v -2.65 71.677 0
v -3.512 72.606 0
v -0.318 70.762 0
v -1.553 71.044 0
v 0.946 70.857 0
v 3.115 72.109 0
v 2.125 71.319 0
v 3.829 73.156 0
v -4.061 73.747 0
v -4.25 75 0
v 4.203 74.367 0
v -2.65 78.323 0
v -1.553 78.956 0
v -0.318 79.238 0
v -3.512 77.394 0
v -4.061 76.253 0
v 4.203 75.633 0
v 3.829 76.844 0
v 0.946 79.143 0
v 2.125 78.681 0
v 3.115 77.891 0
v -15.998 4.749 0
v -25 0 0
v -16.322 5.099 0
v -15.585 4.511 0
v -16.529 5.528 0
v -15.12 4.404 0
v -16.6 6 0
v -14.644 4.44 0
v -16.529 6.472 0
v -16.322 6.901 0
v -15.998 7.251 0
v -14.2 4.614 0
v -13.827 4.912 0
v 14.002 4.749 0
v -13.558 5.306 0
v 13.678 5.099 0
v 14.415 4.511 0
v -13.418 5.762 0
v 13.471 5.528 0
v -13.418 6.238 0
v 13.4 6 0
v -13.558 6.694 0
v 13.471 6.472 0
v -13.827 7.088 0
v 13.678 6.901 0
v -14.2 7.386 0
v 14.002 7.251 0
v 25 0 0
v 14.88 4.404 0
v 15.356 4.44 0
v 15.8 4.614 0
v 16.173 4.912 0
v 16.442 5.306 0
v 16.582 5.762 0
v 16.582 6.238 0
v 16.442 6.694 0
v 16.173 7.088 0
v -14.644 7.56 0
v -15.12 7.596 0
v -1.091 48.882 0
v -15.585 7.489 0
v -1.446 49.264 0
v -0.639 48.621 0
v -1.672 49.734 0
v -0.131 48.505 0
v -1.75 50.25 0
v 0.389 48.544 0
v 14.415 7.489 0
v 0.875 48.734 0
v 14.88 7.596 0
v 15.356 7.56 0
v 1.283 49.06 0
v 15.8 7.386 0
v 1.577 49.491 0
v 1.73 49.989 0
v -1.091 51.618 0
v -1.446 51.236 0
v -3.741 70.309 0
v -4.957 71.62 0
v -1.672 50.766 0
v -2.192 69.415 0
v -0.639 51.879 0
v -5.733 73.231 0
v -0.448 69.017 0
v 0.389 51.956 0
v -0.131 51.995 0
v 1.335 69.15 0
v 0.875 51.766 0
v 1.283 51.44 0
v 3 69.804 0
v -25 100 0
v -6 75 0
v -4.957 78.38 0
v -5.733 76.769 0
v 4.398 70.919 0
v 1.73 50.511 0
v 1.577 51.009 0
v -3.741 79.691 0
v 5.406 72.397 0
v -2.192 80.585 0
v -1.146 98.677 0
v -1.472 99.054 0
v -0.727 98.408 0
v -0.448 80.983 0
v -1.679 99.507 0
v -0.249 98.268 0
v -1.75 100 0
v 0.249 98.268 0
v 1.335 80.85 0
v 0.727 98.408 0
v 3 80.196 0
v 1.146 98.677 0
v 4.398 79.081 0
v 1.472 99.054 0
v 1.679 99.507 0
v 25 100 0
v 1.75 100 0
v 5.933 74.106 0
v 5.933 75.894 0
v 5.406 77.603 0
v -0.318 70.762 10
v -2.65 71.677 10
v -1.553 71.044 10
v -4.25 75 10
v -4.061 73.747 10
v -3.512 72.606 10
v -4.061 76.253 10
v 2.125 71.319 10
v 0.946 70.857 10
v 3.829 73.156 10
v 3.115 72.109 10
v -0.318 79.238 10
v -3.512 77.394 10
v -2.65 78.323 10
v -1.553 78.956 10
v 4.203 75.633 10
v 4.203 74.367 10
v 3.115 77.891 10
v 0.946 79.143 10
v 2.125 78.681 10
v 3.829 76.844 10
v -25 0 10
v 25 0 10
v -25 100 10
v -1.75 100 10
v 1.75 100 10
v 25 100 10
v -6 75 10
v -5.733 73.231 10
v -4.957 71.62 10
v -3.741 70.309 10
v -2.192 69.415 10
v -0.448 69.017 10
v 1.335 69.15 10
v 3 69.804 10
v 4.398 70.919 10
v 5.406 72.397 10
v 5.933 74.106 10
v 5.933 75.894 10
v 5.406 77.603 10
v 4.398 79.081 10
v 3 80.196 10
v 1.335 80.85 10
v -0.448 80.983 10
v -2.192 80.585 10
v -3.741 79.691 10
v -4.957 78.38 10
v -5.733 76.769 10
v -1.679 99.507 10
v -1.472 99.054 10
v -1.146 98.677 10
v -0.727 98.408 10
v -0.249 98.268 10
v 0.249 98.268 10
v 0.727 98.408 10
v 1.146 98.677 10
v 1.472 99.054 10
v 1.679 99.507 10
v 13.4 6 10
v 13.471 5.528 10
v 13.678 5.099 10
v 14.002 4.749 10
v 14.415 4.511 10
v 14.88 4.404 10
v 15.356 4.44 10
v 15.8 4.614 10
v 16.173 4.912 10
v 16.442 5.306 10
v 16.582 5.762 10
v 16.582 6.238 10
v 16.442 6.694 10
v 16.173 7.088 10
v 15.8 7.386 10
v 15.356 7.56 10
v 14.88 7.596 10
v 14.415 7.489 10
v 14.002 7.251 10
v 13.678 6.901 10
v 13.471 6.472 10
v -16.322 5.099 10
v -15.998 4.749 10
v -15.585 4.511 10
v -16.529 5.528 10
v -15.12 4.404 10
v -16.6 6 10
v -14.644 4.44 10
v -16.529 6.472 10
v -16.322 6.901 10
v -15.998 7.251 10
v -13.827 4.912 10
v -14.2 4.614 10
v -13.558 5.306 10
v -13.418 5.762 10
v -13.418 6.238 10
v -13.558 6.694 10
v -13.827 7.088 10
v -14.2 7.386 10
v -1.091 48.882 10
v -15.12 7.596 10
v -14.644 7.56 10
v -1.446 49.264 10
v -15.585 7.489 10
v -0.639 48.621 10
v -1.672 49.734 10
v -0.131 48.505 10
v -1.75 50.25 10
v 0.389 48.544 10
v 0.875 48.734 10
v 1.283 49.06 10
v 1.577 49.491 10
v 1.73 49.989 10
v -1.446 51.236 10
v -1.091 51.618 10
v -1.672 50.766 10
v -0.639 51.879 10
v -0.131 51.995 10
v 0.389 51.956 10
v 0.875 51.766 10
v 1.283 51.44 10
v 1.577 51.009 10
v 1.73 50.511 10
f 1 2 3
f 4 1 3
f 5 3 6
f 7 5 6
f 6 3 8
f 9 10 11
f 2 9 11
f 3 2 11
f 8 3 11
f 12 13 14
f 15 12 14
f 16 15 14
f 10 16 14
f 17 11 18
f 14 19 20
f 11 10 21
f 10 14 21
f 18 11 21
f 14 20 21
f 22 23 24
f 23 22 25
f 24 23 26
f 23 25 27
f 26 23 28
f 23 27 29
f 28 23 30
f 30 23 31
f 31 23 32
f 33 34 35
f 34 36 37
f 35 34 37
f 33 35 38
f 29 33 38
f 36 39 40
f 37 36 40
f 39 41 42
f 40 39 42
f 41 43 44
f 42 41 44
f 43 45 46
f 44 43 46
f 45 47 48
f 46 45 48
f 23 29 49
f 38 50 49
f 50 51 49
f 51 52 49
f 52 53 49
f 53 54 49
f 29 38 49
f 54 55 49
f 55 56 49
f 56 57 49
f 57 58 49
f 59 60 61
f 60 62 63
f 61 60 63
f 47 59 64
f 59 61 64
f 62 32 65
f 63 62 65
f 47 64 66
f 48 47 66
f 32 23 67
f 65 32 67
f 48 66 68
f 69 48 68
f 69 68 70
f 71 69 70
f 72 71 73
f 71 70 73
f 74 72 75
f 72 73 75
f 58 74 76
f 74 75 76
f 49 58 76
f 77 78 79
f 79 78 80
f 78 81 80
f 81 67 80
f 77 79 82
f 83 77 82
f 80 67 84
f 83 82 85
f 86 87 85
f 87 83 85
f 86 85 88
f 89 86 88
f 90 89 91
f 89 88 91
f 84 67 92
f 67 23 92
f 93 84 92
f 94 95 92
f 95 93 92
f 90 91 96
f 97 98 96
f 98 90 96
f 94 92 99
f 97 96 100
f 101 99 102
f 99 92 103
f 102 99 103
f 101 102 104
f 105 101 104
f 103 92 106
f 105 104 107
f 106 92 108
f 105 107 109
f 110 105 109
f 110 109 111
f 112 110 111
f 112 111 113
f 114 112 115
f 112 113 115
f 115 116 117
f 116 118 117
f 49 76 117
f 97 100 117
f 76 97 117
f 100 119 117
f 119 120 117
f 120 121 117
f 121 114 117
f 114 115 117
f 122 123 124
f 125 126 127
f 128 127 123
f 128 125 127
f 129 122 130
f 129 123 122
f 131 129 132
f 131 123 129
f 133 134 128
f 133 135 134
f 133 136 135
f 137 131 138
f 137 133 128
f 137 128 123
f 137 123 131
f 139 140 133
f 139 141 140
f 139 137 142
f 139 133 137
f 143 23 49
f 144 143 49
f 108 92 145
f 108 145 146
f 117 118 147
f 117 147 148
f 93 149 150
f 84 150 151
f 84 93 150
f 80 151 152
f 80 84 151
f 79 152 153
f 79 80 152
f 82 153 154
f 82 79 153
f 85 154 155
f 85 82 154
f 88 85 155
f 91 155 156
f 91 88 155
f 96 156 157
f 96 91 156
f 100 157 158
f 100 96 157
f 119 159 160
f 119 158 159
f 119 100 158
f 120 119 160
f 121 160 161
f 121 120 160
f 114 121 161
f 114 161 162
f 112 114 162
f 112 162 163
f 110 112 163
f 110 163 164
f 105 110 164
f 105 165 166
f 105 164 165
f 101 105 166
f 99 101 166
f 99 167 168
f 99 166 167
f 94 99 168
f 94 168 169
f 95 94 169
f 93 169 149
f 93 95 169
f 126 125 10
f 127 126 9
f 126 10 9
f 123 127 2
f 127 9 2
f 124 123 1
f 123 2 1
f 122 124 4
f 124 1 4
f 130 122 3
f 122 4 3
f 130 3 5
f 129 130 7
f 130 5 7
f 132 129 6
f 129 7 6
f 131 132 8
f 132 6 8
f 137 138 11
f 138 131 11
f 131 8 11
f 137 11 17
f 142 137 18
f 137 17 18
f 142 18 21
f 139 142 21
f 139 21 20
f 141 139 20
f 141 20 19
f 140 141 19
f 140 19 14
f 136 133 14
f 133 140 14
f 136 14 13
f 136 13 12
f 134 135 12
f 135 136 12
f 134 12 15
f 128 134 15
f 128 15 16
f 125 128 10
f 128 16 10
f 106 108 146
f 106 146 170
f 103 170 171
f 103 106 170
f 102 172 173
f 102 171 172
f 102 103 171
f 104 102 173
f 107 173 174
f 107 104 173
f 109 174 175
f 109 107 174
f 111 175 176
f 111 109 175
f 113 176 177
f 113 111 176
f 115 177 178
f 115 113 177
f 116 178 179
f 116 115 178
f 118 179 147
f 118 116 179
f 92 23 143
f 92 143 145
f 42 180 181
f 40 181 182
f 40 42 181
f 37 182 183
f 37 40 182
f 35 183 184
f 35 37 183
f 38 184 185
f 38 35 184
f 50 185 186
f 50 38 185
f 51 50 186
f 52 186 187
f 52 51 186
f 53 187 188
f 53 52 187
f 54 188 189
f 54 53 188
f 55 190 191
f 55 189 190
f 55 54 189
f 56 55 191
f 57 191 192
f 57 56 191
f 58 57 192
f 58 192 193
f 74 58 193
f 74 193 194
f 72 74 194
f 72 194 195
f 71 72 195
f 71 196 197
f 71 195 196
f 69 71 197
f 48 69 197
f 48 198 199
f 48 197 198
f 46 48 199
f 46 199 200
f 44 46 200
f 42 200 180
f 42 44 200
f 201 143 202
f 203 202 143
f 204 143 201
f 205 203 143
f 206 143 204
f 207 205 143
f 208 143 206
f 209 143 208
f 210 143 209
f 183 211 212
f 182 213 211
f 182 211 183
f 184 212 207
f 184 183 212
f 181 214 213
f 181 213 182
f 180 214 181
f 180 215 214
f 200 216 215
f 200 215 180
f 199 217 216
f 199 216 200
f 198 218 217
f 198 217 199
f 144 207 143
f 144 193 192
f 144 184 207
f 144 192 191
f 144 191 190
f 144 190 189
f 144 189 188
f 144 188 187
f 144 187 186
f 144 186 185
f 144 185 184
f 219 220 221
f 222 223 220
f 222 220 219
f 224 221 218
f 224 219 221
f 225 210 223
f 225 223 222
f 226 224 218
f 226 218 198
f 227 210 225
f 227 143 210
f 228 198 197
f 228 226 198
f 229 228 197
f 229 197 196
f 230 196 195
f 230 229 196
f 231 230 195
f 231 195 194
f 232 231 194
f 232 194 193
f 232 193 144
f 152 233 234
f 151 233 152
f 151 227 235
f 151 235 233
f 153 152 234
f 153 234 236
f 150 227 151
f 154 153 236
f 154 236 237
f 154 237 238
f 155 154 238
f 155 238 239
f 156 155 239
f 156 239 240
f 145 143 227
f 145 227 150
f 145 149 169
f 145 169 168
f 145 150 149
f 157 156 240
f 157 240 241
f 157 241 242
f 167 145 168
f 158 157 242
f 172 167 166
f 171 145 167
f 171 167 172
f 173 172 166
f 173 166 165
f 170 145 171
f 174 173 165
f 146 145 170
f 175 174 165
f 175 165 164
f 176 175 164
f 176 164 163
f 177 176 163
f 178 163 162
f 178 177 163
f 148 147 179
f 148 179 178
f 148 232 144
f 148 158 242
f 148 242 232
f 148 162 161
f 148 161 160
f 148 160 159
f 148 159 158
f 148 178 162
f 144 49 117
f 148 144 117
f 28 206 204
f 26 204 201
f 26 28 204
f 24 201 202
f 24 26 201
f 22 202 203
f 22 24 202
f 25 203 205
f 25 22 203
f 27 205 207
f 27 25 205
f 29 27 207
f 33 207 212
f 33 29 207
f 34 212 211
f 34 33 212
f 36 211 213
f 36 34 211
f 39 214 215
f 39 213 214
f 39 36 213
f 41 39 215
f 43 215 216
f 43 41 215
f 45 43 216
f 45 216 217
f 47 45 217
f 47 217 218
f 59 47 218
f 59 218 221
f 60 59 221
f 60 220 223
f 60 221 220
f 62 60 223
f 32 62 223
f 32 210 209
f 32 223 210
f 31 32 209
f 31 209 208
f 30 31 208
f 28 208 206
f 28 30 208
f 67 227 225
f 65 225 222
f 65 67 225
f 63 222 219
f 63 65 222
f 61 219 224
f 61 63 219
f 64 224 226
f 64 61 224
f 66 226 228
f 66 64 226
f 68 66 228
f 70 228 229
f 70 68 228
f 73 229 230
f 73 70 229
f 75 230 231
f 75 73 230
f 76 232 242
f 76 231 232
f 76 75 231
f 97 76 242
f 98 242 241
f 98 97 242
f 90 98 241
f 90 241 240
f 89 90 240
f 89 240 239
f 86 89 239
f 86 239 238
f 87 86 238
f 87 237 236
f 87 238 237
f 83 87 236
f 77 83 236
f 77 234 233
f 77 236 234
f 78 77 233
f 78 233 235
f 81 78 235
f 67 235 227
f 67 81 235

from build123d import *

# Parameters (mm, degrees)
SKETCH1_W           = 50
SKETCH1_H           = 100
BOSS_EXTRUDE1_DEPTH = 10
SKETCH2_R           = 1.6
SKETCH2_R_2         = 1.75
SKETCH2_R_3         = 6
SKETCH2_R_4         = 4.25
CUT_EXTRUDE2_DEPTH  = 11


with BuildPart() as part:
    # Sketch1 → Boss-Extrude1 (new body)
    with BuildSketch(Plane.XY):
        with Locations((0, 50)):
            Rectangle(SKETCH1_W, SKETCH1_H)
    extrude(amount=BOSS_EXTRUDE1_DEPTH)

    # Sketch2 → Cut-Extrude2 (cut)
    # profile 1 of 5: a face of its own
    with BuildSketch(Plane.XY):
        with Locations(Location((15, 6, 0), (0, 0, 180))):
            Circle(SKETCH2_R)
    # profile 2 of 5: a face of its own
    with BuildSketch(Plane.XY):
        with Locations(Location((-15, 6, 0), (0, 0, 180))):
            Circle(SKETCH2_R)
    # profile 3 of 5: a face of its own
    with BuildSketch(Plane.XY):
        with Locations((0, 100)):
            Circle(SKETCH2_R_2)
    # profile 4 of 5: a face of its own
    with BuildSketch(Plane.XY):
        with Locations(Location((0, 50.25, 0), (0, 0, 180))):
            Circle(SKETCH2_R_2)
    # profile 5 of 5: a face of its own
    with BuildSketch(Plane.XY):
        with Locations(Location((0, 75, 0), (0, 0, 180))):
            Circle(SKETCH2_R_3)
        with Locations(Location((0, 75, 0), (0, 0, 180))):
            Circle(SKETCH2_R_4, mode=Mode.SUBTRACT)
    extrude(amount=CUT_EXTRUDE2_DEPTH, mode=Mode.SUBTRACT)


with BuildPart() as cut_extrude2_piece_1:
    # of the separate pieces the step leaves, piece 1, a body of its own (cut_extrude2_pieces)
    add(part.part.solids().sort_by_distance((-25, 0, 0))[0])


with BuildPart() as cut_extrude2_piece_2:
    # of the separate pieces the step leaves, piece 2, a body of its own (cut_extrude2_pieces)
    add(part.part.solids().sort_by_distance((-4.25, 75, 0))[0])


solid = Compound([cut_extrude2_piece_1.part, cut_extrude2_piece_2.part])
